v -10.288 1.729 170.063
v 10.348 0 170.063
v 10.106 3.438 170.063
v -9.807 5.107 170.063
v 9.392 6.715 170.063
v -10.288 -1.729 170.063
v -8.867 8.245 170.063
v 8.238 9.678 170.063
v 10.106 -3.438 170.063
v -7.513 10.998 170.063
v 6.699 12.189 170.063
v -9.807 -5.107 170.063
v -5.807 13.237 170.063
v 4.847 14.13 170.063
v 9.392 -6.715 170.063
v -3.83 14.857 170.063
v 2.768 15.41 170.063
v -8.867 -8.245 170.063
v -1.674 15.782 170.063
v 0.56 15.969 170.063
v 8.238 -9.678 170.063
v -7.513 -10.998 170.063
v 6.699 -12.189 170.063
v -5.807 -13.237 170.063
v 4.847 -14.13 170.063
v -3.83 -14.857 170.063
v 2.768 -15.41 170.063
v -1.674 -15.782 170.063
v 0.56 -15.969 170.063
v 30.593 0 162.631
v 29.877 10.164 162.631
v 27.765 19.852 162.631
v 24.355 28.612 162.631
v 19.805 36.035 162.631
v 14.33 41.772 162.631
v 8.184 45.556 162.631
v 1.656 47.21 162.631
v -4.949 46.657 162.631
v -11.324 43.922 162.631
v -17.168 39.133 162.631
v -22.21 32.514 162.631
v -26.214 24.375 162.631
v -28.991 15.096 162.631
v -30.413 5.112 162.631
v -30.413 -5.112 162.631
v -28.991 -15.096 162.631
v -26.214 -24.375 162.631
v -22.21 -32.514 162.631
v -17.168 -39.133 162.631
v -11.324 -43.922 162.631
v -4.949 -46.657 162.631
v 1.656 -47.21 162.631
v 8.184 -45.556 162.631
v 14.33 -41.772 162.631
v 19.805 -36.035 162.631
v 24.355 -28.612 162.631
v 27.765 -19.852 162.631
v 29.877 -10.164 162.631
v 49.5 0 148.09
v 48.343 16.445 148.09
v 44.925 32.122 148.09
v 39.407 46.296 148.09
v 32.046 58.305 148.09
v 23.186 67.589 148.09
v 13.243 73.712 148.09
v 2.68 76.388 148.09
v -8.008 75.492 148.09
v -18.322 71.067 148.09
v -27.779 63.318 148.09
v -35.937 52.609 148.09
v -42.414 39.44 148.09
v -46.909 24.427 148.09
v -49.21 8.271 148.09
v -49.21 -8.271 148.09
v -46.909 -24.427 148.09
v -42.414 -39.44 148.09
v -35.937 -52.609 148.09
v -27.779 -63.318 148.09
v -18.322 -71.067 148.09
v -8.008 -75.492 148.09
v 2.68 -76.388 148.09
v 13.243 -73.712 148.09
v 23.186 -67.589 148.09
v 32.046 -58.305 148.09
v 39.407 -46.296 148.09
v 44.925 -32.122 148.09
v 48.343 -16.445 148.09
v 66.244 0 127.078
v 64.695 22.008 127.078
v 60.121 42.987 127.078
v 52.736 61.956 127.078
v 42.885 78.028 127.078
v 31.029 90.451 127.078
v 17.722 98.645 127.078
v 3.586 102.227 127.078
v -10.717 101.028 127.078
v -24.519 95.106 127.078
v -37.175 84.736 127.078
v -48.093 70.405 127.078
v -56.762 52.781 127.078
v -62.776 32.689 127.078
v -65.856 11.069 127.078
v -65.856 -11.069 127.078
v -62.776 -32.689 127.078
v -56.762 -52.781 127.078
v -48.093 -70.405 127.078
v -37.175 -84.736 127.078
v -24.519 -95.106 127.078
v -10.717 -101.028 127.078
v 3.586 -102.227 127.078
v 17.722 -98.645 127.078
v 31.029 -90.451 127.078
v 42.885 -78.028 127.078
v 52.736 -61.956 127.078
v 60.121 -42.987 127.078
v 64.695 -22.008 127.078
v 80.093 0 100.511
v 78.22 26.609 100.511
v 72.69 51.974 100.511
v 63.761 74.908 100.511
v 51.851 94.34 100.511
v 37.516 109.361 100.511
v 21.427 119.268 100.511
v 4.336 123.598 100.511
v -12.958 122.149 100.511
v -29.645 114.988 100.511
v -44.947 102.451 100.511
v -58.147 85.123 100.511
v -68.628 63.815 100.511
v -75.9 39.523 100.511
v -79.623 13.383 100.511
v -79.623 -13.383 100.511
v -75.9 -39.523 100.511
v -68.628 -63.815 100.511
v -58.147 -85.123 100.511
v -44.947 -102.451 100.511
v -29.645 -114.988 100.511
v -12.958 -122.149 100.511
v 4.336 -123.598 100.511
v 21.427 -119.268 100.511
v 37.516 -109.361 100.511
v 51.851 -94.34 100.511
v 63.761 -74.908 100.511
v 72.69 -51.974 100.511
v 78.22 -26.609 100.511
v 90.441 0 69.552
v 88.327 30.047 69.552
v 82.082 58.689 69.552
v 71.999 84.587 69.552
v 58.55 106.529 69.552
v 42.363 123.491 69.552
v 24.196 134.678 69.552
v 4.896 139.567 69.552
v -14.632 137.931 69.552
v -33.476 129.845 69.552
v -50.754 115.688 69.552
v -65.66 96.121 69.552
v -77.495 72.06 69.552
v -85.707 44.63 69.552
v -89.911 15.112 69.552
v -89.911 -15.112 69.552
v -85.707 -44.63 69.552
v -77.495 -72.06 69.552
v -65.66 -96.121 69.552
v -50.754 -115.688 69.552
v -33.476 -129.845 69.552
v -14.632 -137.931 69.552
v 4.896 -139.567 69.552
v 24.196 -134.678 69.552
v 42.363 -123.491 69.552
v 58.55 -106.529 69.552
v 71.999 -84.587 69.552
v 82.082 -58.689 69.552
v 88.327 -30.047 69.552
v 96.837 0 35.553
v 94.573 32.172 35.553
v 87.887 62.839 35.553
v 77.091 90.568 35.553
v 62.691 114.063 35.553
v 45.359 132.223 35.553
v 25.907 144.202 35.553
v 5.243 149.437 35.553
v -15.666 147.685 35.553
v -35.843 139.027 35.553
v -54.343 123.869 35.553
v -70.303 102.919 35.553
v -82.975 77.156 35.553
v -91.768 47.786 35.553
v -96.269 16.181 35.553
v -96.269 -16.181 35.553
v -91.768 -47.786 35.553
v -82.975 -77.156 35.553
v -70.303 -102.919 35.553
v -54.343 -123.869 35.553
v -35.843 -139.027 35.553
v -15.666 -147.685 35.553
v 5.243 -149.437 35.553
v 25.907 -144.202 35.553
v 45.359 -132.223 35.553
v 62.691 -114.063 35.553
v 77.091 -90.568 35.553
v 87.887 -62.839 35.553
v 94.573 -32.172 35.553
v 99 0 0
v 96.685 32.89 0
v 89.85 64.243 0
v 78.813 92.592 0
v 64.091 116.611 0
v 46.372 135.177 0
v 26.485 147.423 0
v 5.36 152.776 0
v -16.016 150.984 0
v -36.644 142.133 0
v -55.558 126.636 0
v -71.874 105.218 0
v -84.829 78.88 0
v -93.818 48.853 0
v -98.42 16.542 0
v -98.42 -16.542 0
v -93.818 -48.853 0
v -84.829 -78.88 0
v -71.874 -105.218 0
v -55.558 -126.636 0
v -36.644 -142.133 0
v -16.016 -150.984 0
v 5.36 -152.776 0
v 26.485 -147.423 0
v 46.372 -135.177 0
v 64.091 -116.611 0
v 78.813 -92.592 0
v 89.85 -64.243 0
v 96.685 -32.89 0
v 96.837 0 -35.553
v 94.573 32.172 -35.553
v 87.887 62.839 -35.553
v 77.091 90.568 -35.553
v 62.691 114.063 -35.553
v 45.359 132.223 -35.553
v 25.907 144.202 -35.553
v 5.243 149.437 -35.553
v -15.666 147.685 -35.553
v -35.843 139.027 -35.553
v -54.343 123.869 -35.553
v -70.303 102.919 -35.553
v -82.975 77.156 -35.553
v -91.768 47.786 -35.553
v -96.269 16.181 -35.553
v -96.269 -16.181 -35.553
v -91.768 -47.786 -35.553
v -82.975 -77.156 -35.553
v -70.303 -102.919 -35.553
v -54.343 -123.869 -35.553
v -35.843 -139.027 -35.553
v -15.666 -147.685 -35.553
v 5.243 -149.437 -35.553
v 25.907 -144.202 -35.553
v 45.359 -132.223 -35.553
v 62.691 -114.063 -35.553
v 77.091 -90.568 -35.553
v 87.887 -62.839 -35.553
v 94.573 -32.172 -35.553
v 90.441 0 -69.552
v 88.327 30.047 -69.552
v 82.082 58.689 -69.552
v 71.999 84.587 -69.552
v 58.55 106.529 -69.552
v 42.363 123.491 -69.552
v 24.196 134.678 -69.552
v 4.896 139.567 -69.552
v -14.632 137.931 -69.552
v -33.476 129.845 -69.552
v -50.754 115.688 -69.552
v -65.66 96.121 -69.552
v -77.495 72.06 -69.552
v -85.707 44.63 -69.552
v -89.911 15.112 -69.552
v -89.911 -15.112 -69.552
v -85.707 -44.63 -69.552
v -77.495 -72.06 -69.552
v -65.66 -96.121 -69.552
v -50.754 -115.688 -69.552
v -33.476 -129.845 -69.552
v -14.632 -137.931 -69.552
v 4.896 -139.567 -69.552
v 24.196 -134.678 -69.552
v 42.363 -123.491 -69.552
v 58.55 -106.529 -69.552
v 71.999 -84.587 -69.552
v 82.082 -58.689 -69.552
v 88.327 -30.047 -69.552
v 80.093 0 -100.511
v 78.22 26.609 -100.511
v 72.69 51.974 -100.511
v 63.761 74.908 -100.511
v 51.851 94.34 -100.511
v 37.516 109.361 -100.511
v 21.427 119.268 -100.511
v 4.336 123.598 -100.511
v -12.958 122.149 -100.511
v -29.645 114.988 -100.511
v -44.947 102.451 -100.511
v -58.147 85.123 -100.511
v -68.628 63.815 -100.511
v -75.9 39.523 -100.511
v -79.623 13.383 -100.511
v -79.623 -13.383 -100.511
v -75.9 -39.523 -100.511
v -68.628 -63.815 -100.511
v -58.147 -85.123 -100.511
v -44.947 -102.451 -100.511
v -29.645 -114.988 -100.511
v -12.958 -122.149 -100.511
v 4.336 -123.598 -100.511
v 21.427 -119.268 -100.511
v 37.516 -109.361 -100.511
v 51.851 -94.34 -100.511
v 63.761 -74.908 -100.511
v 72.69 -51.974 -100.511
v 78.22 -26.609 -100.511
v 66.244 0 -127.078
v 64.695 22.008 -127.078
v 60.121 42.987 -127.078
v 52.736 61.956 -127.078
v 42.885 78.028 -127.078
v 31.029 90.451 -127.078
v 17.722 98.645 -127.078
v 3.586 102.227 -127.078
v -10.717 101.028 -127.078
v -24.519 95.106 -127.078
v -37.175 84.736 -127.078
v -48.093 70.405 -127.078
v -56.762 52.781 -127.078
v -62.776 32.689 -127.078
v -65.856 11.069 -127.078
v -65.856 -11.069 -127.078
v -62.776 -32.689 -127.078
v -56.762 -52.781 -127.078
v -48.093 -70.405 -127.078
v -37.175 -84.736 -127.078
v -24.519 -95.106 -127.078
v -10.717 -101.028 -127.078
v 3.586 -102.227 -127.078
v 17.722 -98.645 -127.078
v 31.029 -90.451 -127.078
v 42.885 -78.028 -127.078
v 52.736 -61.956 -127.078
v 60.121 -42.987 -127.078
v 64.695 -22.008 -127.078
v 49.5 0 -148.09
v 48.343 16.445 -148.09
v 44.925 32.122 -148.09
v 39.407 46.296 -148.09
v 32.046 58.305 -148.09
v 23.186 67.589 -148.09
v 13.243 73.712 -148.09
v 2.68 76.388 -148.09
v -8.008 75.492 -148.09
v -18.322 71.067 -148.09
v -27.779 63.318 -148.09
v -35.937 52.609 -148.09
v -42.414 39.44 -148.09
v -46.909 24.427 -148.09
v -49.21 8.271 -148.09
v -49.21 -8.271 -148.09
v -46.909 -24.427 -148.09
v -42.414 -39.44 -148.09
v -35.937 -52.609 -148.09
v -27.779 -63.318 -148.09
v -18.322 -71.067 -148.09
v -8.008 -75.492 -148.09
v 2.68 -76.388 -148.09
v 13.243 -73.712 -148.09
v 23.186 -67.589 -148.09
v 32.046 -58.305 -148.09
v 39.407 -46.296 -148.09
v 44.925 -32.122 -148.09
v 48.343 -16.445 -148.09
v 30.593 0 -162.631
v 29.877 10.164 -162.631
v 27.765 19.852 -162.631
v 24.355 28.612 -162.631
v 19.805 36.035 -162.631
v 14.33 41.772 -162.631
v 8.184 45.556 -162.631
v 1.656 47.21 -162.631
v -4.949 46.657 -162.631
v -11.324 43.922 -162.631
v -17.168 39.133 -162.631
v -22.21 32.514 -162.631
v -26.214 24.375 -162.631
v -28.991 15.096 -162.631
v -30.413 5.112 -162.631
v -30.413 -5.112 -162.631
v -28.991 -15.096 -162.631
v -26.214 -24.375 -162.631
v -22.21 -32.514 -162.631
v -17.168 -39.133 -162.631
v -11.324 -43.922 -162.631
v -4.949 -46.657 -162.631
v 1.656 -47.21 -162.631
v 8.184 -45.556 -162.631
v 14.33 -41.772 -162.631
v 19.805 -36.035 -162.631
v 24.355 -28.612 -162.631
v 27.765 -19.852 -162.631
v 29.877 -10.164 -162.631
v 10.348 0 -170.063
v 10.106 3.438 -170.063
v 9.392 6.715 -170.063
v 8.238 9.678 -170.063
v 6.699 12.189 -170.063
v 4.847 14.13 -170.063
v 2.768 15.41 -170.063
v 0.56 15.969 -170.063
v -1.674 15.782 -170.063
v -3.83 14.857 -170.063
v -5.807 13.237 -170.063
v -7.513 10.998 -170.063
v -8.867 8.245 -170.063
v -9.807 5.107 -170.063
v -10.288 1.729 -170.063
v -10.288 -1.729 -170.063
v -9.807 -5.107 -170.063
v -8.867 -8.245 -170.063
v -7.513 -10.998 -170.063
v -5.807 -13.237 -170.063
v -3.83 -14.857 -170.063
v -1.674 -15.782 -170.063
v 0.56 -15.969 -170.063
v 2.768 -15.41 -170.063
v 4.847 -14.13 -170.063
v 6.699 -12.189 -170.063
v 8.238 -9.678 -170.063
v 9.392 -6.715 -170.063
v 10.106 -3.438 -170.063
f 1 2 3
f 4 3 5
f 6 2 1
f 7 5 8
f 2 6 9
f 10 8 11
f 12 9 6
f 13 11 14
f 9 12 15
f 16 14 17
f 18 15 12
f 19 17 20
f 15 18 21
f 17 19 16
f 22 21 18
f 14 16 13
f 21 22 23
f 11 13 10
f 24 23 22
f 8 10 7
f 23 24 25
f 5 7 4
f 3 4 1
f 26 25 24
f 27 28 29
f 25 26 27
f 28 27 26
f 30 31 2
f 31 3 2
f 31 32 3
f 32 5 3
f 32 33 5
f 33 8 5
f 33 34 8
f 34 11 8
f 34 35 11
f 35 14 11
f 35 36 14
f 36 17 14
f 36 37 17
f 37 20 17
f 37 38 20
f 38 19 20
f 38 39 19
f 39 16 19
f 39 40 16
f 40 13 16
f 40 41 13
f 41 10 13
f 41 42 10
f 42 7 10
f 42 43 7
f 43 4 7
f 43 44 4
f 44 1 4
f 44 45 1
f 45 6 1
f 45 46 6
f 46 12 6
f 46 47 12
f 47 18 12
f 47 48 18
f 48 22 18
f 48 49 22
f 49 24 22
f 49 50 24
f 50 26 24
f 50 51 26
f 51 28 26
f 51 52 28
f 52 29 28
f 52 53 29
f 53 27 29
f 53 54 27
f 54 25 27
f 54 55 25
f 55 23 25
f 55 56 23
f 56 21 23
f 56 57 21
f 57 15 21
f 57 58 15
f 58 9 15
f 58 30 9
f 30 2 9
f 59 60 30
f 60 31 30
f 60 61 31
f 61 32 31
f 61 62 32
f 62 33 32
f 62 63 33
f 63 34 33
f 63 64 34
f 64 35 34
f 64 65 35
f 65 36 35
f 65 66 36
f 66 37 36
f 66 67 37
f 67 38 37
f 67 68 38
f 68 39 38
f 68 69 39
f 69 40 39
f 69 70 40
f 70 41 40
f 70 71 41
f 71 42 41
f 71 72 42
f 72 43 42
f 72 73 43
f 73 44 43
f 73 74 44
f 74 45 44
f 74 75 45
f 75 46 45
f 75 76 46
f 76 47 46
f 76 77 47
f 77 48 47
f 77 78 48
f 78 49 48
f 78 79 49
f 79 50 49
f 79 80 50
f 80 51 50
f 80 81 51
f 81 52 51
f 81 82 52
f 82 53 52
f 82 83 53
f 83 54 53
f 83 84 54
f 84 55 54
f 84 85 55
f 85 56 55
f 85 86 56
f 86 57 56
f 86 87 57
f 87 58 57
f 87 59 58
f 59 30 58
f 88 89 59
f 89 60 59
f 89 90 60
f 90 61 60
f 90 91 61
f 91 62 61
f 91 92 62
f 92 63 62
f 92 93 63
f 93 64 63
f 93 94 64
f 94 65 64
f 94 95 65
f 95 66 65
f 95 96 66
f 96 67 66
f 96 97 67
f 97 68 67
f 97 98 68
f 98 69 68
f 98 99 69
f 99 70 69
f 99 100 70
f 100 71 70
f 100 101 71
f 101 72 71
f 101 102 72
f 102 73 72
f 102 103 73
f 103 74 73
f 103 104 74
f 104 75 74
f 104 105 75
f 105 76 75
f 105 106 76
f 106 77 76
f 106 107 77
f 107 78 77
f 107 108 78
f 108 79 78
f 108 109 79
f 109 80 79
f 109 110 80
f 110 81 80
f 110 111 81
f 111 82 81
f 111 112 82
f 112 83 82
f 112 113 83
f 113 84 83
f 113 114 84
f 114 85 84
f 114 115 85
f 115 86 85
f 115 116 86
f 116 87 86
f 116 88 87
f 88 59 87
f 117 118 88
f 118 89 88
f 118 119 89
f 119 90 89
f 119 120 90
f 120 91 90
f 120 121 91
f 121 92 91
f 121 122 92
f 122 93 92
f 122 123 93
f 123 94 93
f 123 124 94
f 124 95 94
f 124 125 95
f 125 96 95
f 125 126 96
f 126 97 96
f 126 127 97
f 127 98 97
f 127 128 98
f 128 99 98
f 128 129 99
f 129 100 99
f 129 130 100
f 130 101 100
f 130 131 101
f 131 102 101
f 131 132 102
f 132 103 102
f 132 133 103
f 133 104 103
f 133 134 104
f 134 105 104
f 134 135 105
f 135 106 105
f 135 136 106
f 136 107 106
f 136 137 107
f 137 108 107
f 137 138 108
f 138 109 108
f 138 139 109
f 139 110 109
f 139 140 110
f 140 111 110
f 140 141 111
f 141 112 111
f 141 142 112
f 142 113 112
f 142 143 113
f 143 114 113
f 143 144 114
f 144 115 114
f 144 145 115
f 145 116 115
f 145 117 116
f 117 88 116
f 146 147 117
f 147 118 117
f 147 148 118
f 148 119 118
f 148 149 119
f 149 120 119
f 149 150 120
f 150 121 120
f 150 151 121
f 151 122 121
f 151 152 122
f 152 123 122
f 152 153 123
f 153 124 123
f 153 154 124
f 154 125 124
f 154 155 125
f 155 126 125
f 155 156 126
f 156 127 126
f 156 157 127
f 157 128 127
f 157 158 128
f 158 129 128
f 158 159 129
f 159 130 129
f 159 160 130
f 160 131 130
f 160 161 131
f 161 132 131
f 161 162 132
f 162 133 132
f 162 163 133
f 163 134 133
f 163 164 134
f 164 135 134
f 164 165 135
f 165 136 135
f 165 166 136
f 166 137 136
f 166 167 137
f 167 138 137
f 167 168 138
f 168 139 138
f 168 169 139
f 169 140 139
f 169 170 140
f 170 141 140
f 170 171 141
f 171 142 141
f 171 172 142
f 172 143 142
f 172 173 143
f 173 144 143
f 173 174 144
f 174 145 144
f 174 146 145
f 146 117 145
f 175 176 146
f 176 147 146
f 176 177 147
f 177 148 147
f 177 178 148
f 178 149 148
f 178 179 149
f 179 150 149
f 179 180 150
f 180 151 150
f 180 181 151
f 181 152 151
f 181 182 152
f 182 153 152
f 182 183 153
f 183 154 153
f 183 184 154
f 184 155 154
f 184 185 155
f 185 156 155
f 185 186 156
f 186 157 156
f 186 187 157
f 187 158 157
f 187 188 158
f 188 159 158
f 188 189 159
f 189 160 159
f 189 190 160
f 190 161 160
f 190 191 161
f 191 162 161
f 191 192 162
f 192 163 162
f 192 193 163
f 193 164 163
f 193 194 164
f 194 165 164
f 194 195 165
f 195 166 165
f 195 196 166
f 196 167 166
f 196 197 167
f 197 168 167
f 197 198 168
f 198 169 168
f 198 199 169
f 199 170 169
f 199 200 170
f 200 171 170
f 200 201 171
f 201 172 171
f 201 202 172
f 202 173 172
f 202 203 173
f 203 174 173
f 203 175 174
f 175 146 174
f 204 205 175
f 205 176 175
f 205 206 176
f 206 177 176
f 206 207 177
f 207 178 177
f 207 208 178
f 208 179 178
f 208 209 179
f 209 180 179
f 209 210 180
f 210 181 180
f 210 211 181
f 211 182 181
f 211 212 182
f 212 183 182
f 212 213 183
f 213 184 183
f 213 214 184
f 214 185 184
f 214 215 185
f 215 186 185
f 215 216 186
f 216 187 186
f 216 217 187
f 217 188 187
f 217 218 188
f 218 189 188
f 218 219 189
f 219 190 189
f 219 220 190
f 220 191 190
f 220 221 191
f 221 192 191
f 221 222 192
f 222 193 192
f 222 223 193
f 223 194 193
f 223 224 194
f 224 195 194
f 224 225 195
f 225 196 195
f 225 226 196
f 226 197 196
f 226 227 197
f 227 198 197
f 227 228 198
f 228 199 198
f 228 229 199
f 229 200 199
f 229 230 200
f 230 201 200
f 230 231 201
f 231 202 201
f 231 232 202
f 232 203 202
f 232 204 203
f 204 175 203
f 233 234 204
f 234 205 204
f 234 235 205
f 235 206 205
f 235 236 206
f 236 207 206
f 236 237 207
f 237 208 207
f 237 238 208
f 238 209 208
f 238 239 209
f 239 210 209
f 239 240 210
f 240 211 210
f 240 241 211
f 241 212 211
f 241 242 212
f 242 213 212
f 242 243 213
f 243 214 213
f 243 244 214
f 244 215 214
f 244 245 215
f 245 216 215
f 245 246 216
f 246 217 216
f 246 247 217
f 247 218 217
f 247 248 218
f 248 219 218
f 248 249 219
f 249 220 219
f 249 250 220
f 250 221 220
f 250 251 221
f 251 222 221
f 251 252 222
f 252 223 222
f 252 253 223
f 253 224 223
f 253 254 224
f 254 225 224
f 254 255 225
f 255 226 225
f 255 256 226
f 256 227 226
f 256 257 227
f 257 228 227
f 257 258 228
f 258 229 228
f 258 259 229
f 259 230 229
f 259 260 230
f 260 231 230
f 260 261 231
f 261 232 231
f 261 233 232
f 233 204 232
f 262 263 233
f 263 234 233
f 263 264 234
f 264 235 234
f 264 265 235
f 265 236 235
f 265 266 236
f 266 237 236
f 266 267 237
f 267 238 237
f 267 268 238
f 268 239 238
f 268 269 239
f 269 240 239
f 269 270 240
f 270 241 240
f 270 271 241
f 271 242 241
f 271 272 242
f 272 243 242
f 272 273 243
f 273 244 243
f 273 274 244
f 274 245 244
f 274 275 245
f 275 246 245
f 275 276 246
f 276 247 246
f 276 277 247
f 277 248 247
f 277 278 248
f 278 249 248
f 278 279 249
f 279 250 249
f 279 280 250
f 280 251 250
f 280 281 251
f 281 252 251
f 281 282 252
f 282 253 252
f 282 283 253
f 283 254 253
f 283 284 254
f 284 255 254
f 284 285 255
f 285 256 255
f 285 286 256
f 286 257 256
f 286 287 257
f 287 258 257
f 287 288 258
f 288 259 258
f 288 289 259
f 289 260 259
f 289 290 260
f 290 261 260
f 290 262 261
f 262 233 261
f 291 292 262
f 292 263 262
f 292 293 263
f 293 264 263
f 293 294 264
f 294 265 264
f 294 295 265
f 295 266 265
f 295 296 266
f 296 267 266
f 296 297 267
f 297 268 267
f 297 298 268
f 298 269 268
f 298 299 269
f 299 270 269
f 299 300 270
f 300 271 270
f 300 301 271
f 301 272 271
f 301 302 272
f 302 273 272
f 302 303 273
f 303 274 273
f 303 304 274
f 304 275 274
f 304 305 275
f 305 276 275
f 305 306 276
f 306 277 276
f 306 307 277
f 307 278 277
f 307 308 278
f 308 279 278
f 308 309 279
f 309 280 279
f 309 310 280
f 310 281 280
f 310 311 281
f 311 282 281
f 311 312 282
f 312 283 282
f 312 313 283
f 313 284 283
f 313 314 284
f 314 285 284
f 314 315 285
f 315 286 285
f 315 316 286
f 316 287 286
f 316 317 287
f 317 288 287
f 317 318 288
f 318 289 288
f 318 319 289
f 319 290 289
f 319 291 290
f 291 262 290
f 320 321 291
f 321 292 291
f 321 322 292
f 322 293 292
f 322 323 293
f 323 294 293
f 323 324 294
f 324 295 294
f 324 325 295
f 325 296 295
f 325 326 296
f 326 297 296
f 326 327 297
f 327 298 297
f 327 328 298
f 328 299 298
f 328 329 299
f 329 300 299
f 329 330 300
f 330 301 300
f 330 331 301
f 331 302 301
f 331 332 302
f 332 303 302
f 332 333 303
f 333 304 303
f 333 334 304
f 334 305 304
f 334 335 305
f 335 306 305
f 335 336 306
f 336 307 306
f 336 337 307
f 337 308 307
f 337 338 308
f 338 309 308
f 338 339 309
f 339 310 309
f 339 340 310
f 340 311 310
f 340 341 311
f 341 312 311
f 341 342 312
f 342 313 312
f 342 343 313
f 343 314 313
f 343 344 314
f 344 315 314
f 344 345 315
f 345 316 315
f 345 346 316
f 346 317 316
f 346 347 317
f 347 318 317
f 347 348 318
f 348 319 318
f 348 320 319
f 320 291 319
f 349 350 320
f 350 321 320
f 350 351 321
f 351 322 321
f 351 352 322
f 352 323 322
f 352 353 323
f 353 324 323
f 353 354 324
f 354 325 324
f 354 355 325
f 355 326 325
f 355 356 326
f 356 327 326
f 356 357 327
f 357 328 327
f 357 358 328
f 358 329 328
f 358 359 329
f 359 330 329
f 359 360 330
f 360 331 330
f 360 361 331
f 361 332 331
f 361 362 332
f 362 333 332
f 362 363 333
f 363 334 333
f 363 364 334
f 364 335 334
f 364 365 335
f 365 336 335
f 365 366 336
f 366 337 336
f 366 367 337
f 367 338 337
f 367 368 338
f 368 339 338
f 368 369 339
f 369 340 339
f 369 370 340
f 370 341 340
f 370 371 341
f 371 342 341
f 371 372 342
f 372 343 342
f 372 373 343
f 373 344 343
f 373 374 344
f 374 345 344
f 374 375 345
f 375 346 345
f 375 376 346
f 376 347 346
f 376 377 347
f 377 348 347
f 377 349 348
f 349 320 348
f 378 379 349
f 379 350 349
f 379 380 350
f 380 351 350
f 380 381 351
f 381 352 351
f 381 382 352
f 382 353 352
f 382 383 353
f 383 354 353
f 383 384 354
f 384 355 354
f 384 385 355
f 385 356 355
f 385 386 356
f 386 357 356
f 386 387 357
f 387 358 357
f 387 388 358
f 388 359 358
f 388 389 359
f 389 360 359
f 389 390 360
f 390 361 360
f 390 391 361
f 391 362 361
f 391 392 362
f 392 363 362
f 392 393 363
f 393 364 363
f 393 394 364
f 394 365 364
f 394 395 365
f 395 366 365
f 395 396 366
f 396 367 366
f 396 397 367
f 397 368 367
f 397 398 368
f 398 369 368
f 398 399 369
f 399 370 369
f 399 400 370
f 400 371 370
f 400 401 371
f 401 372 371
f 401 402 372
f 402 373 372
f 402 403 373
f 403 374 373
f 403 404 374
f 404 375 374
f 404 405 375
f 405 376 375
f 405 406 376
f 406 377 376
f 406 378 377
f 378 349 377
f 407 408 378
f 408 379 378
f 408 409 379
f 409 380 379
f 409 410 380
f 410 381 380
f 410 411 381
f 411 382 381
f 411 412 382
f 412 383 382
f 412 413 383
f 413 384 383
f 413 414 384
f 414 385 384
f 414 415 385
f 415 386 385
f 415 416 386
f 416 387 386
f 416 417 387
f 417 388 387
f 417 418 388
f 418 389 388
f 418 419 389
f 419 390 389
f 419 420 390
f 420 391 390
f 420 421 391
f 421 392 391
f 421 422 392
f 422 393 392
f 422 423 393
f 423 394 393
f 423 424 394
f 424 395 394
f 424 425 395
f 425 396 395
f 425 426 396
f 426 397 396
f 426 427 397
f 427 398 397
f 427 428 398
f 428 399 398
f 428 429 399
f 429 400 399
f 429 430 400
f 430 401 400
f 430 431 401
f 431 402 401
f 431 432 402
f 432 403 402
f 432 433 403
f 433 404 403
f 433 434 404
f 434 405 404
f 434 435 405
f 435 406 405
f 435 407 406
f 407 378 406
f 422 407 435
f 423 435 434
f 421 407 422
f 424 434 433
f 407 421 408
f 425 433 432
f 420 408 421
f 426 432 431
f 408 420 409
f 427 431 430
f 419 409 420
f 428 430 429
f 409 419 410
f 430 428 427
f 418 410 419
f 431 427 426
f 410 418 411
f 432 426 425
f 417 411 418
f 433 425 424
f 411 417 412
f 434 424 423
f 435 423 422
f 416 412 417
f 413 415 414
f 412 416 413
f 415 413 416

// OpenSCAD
// Generated by SolidPython 1.0.1 on 2020-07-29 00:46:50


scale(v = [11, 17, 19]) {
	sphere(r = 9);
}
/***********************************************
*********      SolidPython code:      **********
************************************************
 
# import packages: SolidPython
from solid import *
from solid.utils import *
from itertools import chain, combinations, permutations


class Resize:

    def __init__(self, scad_file):
        self.scad_file = scad_file
        #self.scad_file = import_scad(scad_file)
        # cone/cylinder param:
        self.r1 = 0
        self.r2 = 0
        self.h = 0
        # rectangular prism param:
        self.w = 0
        self.l = 0
        # ellipse param:
        self.r = 0

    # import OpenScad code (file name corresponds to shape)


    # classify shape + parameters
    def assign(self, param1, param2, param3):
        if self.scad_file == 'cone.scad':
            self.r1 = param1
            self.r2 = param2
            self.h = param3
        elif self.scad_file == 'cylinder.scad':
            self.r1 = param1
            self.r2 = param2
            self.h = param3
        elif self.scad_file == 'rectangularPrism.scad':
            self.h = param1
            self.l = param2
            self.w = param3
        else:
            self.r = param1
            self.h = param2

    # resize parameters
    def iterate(self):
        x = range(3, 20, 2)
        i = 1
        if self.scad_file == 'cone.scad':
            tempList = list(permutations(x, 2))
            for temp in tempList:
                param1 = temp[0]
                param2 = temp[1]
                filepath = 'produced_scad_files/' + 'cone' + str(param1) + '_' + str(param2) + '_' + '.scad'
                scad_render_to_file(cylinder(h=param1, r1=param2, r2=0), filepath)

        elif self.scad_file == 'cylinder.scad':
            tempList = list(permutations(x, 3))
            for temp in tempList:
                param1 = temp[0]
                param2 = temp[1]
                filepath = 'produced_scad_files/' + 'cylinder' + str(param1) + '_' + str(param2) + '_' + '.scad'
                scad_render_to_file(cylinder(h=param1, r1=param2, r2=param2), filepath)

        elif self.scad_file == 'rectangularPrism.scad':
            tempList = list(permutations(x, 3))
            for temp in tempList:
                param1 = temp[0]
                param2 = temp[1]
                param3 = temp[2]
                filepath = 'produced_scad_files/' + 'rectangularPrism' + str(param1) + '_' + str(param2) + '_' + str(
                    param3) + '.scad'
                scad_render_to_file(cube(size=(param1, param2, param3)), filepath)

        elif self.scad_file == 'ellipse.scad':
            tempList = list(permutations(x, 4))
            for temp in tempList:
                param1 = temp[0]
                param2 = temp[1]
                param3 = temp[2]
                param4 = temp[3]
                filepath = 'produced_scad_files/' + 'ellipse' + str(param1) + '_' + str(param2) + '_' + str(param3) + '_' + str(param4) + '.scad'
                scad_render_to_file(scale([param1, param2, param3])(sphere(r=param4)), filepath)

    def render_to_scadfile(self):
        scad_render_to_file(scad, 'example.scad') 
 
************************************************/
